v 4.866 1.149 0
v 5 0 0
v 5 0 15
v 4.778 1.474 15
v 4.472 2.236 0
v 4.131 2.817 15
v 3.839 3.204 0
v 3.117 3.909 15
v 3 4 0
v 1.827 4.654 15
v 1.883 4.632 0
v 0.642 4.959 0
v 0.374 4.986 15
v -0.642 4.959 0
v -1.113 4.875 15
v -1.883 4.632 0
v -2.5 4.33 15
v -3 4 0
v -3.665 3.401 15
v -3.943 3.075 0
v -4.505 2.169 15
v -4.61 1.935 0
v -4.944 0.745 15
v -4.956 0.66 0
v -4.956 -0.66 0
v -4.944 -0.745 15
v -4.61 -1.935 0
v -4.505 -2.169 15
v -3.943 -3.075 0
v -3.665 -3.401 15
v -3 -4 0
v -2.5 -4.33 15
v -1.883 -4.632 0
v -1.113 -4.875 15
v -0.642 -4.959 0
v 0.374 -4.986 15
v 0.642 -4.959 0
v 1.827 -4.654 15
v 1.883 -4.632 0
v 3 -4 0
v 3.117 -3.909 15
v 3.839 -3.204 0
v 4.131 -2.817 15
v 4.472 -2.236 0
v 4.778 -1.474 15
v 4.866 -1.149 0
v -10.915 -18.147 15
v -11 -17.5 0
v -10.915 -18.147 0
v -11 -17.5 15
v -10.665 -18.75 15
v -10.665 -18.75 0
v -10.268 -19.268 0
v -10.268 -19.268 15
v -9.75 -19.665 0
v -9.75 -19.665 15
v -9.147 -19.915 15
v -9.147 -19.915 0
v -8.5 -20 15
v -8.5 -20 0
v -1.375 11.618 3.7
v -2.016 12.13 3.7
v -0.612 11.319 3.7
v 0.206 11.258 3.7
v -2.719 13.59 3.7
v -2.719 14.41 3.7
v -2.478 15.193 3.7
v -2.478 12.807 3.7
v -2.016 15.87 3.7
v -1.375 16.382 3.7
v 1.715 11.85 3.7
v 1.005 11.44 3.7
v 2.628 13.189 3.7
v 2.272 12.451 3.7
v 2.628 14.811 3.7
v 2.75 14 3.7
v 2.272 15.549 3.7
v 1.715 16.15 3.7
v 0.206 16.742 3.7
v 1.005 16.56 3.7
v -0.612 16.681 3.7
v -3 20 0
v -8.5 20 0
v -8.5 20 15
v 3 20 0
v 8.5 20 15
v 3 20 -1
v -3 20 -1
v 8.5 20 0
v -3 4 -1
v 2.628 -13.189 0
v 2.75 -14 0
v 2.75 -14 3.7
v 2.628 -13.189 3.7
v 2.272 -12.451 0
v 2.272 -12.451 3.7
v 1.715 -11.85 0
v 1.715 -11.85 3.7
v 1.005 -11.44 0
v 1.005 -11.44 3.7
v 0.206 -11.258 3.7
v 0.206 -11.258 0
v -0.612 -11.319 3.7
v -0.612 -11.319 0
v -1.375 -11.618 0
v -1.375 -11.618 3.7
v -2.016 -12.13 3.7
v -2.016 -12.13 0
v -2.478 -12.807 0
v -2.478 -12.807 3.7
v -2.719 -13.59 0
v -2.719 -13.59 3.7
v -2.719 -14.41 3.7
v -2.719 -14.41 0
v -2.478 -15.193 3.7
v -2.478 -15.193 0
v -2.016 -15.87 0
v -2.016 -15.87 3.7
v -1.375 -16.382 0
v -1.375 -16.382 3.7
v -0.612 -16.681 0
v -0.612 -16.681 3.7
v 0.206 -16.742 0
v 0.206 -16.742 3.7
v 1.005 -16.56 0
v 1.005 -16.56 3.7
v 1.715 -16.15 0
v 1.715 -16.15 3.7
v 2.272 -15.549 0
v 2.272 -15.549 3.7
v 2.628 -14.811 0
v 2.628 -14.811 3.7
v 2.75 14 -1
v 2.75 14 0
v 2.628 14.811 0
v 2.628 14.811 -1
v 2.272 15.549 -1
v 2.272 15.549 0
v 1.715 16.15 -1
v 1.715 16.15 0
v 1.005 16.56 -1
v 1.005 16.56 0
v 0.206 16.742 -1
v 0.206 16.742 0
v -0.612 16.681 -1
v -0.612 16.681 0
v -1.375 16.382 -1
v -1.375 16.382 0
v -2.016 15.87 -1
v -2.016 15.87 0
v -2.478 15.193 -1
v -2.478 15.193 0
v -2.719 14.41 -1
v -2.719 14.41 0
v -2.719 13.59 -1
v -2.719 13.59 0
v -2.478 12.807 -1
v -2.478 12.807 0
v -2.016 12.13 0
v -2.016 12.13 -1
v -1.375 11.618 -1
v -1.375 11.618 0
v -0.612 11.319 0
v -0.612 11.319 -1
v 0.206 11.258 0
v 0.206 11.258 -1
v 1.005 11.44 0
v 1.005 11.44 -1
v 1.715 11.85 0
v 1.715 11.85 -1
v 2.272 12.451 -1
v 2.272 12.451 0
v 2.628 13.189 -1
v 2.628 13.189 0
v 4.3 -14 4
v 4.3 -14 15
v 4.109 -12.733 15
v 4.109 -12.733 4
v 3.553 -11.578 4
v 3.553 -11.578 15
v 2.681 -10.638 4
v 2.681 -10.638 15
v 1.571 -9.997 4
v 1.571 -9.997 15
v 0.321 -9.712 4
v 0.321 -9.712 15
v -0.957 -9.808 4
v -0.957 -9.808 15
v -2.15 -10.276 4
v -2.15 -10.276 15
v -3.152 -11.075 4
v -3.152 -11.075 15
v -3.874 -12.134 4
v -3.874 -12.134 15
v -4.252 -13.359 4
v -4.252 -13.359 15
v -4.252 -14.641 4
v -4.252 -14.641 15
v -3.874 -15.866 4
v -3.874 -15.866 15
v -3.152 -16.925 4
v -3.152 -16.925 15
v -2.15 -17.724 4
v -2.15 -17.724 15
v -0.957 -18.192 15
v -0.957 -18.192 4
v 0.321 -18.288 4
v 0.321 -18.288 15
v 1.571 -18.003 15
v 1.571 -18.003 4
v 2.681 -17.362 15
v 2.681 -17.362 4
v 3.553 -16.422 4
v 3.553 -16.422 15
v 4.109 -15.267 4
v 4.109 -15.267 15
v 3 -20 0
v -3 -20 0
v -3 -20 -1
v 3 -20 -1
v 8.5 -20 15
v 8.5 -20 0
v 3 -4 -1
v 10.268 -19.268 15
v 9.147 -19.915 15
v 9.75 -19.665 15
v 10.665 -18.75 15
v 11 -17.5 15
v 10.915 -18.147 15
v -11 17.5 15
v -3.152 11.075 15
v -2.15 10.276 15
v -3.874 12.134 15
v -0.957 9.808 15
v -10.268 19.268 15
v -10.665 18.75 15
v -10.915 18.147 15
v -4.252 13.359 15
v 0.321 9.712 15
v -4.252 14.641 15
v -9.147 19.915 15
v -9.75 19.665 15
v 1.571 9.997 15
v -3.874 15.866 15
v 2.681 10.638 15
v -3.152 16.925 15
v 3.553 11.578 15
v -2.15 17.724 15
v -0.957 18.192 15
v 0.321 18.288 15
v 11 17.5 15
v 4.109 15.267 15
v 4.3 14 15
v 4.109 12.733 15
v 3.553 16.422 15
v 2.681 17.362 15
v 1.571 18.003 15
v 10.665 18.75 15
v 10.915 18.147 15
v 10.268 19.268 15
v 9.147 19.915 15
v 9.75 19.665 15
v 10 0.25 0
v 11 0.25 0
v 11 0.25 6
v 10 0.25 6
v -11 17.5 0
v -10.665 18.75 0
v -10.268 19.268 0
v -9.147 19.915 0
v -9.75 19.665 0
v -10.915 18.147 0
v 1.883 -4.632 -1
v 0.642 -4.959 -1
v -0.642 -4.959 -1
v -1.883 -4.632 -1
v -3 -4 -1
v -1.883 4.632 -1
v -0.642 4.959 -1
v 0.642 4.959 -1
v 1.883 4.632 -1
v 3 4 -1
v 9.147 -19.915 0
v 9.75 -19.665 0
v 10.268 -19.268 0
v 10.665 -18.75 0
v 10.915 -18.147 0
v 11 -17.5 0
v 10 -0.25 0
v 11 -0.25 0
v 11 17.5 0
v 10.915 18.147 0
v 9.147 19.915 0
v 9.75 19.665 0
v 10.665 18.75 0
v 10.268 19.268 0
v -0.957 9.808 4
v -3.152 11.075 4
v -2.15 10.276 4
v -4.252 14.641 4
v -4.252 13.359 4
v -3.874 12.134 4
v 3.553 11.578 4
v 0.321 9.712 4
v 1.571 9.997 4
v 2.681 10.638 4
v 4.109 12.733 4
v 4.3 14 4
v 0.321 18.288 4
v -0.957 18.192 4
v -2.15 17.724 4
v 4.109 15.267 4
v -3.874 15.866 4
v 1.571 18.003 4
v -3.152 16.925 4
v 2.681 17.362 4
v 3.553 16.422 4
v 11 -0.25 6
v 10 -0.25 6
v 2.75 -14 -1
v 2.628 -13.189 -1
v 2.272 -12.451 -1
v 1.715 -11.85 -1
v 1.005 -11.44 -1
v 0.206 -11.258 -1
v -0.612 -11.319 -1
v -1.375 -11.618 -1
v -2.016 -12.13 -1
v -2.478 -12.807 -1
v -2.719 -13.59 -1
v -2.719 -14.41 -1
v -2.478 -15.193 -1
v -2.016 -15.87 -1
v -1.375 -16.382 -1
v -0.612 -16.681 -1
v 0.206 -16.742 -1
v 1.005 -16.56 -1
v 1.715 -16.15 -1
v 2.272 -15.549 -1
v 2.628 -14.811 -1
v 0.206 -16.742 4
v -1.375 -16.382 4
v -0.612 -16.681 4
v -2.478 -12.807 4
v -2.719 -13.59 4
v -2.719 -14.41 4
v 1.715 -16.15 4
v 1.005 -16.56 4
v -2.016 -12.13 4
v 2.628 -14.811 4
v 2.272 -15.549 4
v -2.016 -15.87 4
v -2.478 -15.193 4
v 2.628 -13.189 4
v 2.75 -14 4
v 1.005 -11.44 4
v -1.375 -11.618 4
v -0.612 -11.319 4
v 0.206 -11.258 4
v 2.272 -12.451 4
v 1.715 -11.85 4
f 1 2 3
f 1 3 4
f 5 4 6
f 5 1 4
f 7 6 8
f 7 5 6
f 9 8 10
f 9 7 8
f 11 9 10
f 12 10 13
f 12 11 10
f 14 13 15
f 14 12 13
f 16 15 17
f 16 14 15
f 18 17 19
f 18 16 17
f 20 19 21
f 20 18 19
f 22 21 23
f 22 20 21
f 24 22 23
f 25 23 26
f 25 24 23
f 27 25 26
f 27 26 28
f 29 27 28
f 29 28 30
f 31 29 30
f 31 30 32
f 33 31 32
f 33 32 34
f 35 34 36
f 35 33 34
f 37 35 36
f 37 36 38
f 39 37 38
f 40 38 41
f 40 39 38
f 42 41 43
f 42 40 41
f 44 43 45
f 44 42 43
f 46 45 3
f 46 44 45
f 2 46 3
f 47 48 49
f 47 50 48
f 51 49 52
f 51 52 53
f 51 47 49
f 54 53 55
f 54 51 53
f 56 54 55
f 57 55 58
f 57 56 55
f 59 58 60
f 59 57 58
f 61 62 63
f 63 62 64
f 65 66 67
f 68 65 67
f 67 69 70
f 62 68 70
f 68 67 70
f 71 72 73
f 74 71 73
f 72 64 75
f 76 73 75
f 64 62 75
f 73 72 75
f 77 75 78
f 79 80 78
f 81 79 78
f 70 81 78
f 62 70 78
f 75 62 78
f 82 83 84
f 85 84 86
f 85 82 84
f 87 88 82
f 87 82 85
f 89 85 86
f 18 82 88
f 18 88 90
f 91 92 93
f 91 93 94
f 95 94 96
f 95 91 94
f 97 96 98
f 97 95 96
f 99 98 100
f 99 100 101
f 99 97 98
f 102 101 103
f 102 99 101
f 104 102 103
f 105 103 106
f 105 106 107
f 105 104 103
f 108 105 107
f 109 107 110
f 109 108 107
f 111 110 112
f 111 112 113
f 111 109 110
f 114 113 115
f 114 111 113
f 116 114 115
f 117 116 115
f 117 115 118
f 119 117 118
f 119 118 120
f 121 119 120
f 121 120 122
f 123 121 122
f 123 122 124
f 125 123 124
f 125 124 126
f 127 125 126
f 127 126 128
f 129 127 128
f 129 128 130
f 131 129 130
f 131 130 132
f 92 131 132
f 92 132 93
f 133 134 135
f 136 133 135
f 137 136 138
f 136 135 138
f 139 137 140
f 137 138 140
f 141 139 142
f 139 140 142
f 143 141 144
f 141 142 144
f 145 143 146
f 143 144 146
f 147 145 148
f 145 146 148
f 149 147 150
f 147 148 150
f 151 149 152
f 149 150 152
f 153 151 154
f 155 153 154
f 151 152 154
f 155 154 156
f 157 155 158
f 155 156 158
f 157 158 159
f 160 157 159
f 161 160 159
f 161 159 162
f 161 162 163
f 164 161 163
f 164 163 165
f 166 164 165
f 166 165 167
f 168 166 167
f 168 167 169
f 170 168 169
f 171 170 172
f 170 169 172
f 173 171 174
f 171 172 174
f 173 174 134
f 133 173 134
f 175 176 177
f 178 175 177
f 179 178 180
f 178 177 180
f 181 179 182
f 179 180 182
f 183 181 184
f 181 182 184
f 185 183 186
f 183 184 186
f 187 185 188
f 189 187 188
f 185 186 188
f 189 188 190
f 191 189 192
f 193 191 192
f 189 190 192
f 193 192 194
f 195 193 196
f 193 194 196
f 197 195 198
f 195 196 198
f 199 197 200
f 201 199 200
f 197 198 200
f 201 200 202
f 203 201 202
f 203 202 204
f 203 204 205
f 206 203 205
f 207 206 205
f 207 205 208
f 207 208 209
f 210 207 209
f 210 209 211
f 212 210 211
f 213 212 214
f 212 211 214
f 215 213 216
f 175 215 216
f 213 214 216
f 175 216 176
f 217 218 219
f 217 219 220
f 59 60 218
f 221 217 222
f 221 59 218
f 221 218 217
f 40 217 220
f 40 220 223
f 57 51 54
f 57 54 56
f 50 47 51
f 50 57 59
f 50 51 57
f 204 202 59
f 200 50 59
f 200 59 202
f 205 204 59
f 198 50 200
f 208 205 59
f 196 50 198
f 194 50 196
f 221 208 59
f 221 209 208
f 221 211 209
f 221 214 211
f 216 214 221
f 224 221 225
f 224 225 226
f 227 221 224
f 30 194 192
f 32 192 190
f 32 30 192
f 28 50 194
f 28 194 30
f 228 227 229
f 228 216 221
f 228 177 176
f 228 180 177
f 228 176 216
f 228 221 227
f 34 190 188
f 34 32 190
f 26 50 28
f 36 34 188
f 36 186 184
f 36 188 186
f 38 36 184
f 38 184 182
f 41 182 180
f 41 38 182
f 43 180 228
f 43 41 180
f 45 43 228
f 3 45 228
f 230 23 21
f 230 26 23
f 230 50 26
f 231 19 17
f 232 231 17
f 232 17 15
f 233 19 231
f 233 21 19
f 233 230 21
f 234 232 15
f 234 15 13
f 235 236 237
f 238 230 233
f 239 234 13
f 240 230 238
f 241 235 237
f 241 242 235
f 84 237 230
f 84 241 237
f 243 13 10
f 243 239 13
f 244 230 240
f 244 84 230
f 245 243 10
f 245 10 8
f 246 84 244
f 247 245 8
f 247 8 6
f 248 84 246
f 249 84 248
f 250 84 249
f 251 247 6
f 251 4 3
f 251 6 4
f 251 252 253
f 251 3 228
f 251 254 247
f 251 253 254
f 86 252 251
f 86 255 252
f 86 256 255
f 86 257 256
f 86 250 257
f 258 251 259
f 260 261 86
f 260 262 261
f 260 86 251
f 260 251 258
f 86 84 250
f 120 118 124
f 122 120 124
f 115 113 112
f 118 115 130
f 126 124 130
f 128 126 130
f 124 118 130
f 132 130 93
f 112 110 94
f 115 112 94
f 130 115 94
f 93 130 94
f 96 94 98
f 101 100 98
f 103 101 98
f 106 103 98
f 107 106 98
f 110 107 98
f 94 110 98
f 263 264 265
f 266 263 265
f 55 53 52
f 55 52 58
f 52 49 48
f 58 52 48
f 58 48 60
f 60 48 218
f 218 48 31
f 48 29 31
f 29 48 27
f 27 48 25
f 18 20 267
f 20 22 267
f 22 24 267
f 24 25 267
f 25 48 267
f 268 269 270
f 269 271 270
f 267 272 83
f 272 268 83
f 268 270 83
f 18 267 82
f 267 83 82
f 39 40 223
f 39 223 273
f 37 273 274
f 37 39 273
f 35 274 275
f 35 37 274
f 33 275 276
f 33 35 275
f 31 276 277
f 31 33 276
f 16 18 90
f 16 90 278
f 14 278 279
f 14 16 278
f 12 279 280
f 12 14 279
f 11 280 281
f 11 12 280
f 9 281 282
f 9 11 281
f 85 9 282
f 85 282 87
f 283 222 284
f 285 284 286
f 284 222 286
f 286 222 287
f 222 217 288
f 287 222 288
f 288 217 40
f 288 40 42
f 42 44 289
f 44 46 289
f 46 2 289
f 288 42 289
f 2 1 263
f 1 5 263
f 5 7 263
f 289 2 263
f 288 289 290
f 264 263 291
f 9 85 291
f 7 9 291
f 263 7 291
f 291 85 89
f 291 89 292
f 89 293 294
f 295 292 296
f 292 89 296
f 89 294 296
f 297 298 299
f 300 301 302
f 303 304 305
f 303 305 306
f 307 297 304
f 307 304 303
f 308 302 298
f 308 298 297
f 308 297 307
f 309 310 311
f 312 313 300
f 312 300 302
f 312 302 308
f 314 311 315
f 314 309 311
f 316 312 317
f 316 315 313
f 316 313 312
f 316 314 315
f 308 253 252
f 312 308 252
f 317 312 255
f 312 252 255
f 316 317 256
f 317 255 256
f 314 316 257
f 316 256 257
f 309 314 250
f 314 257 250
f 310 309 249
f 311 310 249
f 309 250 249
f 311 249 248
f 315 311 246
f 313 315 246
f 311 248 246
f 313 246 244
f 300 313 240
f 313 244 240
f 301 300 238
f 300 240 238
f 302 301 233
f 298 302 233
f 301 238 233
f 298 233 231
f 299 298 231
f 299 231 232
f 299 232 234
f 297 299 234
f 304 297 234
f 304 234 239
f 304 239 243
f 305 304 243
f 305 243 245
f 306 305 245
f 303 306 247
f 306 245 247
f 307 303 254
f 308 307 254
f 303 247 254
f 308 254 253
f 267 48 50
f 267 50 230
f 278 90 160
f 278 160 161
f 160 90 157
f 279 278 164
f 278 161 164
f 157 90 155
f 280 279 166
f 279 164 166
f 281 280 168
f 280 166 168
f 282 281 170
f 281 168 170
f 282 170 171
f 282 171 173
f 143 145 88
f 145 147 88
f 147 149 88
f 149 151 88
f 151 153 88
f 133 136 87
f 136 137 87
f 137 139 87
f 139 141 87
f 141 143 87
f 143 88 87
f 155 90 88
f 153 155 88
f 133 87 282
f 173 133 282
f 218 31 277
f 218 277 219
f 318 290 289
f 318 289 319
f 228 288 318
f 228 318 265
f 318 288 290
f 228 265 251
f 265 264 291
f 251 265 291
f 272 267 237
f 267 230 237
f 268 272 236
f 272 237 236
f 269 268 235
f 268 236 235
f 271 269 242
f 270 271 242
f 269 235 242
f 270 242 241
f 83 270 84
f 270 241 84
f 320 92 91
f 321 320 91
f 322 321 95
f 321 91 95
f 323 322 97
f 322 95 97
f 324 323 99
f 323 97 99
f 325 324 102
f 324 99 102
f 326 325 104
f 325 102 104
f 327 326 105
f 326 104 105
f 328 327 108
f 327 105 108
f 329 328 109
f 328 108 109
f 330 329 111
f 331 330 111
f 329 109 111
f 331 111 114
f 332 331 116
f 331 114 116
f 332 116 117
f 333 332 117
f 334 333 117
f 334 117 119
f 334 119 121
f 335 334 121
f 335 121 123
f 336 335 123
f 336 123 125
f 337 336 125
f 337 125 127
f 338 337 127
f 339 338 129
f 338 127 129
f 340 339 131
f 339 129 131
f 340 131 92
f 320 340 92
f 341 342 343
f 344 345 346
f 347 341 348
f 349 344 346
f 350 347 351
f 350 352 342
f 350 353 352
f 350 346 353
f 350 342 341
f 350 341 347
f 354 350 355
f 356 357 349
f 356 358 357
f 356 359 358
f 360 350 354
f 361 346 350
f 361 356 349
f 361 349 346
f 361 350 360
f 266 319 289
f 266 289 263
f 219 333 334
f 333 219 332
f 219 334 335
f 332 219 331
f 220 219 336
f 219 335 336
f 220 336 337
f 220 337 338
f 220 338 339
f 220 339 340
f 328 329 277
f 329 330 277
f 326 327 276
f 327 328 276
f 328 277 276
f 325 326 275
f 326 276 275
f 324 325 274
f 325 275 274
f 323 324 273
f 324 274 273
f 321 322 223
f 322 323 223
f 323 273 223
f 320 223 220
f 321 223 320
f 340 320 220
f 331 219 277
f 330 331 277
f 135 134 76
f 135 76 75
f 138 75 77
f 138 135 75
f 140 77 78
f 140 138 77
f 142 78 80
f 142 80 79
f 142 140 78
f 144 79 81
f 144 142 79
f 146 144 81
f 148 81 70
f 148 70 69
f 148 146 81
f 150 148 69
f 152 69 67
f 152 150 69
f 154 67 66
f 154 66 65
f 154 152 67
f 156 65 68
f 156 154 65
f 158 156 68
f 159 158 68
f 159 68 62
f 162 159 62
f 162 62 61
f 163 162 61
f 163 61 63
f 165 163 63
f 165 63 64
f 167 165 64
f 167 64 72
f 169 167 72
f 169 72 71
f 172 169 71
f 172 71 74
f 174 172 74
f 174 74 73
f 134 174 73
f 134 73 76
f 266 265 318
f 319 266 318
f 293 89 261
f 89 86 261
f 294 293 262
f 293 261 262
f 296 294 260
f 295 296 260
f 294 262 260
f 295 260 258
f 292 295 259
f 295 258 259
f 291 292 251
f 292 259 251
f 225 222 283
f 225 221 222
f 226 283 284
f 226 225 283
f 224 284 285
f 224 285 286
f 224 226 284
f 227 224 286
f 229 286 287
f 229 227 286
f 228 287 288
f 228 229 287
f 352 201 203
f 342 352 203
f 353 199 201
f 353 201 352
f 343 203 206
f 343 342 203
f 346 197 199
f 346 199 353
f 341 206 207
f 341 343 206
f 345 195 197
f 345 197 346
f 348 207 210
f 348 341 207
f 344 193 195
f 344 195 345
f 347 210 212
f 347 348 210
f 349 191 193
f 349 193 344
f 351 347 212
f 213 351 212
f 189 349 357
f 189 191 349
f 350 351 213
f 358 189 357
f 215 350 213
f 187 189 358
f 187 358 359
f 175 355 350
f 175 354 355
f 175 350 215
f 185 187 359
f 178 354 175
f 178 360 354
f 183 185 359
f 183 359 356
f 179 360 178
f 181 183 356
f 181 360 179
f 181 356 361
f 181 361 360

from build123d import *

# Parameters (mm, degrees)
F1_W      = 22
F1_H      = 40
F1_R      = 2.75
F1_R_2    = 5
F2_DEPTH  = 15
F3_R      = 4.3
F4_DEPTH  = 11
F5_R      = 2.5
F6_R      = 2.75
F7_DEPTH  = 1
F8_R      = 2.75
F9_DEPTH  = 0.3
F10_W     = 0.25
F10_H     = 6
F11_DEPTH = 1


with BuildPart() as f2:
    # F1 (on Top) → F2 (new body)
    with BuildSketch(Plane.XY):
        Rectangle(F1_W, F1_H)
        with Locations((0, -14)):
            Circle(F1_R, mode=Mode.SUBTRACT)
        Circle(F1_R_2, mode=Mode.SUBTRACT)
        with Locations((0, 14)):
            Circle(F1_R, mode=Mode.SUBTRACT)
    extrude(amount=F2_DEPTH)

    # F3 (on face) → F4 (cut)
    with BuildSketch(Plane.XY.offset(15)):
        with Locations((0, 14)):
            Circle(F3_R)
        with Locations((0, -14)):
            Circle(F3_R)
    extrude(amount=-F4_DEPTH, mode=Mode.SUBTRACT)

    # F5
    f5_edges = [f2.edges().sort_by_distance(p)[0] for p in [
        (11, -20, 7.5),
        (-11, -20, 7.5),
        (11, 20, 7.5),
        (-11, 20, 7.5),
    ]]
    fillet(f5_edges, radius=F5_R)

    # F6 (on face) → F7 (join)
    with BuildSketch(Plane.XY):
        with BuildLine():
            Line((-3, -20), (0, -20))
            Line((0, -20), (3, -20))
            Line((3, -20), (3, -4))
            ThreePointArc((3, -4), (0, -5), (-3, -4))
            Line((-3, -4), (-3, -20))
        make_face()
        with Locations((0, -14)):
            Circle(F6_R, mode=Mode.SUBTRACT)
        with BuildLine():
            Line((3, 20), (0, 20))
            Line((0, 20), (-3, 20))
            Line((-3, 20), (-3, 4))
            ThreePointArc((-3, 4), (0, 5), (3, 4))
            Line((3, 4), (3, 20))
        make_face()
        with Locations((0, 14)):
            Circle(F6_R, mode=Mode.SUBTRACT)
    extrude(amount=-F7_DEPTH)

    # F8 (on face) → F9 (join)
    with BuildSketch(Plane.XY.offset(4)):
        with Locations((0, 14)):
            Circle(F8_R)
        with Locations((0, -14)):
            Circle(F8_R)
    extrude(amount=-F9_DEPTH)

    # F10 (on face) → F11 (cut)
    with BuildSketch(Plane.YZ.offset(11)):
        with Locations((0.125, 3)):
            Rectangle(F10_W, F10_H)
        with Locations((-0.125, 3)):
            Rectangle(F10_W, F10_H)
    extrude(amount=-F11_DEPTH, mode=Mode.SUBTRACT)


solid = f2.part
